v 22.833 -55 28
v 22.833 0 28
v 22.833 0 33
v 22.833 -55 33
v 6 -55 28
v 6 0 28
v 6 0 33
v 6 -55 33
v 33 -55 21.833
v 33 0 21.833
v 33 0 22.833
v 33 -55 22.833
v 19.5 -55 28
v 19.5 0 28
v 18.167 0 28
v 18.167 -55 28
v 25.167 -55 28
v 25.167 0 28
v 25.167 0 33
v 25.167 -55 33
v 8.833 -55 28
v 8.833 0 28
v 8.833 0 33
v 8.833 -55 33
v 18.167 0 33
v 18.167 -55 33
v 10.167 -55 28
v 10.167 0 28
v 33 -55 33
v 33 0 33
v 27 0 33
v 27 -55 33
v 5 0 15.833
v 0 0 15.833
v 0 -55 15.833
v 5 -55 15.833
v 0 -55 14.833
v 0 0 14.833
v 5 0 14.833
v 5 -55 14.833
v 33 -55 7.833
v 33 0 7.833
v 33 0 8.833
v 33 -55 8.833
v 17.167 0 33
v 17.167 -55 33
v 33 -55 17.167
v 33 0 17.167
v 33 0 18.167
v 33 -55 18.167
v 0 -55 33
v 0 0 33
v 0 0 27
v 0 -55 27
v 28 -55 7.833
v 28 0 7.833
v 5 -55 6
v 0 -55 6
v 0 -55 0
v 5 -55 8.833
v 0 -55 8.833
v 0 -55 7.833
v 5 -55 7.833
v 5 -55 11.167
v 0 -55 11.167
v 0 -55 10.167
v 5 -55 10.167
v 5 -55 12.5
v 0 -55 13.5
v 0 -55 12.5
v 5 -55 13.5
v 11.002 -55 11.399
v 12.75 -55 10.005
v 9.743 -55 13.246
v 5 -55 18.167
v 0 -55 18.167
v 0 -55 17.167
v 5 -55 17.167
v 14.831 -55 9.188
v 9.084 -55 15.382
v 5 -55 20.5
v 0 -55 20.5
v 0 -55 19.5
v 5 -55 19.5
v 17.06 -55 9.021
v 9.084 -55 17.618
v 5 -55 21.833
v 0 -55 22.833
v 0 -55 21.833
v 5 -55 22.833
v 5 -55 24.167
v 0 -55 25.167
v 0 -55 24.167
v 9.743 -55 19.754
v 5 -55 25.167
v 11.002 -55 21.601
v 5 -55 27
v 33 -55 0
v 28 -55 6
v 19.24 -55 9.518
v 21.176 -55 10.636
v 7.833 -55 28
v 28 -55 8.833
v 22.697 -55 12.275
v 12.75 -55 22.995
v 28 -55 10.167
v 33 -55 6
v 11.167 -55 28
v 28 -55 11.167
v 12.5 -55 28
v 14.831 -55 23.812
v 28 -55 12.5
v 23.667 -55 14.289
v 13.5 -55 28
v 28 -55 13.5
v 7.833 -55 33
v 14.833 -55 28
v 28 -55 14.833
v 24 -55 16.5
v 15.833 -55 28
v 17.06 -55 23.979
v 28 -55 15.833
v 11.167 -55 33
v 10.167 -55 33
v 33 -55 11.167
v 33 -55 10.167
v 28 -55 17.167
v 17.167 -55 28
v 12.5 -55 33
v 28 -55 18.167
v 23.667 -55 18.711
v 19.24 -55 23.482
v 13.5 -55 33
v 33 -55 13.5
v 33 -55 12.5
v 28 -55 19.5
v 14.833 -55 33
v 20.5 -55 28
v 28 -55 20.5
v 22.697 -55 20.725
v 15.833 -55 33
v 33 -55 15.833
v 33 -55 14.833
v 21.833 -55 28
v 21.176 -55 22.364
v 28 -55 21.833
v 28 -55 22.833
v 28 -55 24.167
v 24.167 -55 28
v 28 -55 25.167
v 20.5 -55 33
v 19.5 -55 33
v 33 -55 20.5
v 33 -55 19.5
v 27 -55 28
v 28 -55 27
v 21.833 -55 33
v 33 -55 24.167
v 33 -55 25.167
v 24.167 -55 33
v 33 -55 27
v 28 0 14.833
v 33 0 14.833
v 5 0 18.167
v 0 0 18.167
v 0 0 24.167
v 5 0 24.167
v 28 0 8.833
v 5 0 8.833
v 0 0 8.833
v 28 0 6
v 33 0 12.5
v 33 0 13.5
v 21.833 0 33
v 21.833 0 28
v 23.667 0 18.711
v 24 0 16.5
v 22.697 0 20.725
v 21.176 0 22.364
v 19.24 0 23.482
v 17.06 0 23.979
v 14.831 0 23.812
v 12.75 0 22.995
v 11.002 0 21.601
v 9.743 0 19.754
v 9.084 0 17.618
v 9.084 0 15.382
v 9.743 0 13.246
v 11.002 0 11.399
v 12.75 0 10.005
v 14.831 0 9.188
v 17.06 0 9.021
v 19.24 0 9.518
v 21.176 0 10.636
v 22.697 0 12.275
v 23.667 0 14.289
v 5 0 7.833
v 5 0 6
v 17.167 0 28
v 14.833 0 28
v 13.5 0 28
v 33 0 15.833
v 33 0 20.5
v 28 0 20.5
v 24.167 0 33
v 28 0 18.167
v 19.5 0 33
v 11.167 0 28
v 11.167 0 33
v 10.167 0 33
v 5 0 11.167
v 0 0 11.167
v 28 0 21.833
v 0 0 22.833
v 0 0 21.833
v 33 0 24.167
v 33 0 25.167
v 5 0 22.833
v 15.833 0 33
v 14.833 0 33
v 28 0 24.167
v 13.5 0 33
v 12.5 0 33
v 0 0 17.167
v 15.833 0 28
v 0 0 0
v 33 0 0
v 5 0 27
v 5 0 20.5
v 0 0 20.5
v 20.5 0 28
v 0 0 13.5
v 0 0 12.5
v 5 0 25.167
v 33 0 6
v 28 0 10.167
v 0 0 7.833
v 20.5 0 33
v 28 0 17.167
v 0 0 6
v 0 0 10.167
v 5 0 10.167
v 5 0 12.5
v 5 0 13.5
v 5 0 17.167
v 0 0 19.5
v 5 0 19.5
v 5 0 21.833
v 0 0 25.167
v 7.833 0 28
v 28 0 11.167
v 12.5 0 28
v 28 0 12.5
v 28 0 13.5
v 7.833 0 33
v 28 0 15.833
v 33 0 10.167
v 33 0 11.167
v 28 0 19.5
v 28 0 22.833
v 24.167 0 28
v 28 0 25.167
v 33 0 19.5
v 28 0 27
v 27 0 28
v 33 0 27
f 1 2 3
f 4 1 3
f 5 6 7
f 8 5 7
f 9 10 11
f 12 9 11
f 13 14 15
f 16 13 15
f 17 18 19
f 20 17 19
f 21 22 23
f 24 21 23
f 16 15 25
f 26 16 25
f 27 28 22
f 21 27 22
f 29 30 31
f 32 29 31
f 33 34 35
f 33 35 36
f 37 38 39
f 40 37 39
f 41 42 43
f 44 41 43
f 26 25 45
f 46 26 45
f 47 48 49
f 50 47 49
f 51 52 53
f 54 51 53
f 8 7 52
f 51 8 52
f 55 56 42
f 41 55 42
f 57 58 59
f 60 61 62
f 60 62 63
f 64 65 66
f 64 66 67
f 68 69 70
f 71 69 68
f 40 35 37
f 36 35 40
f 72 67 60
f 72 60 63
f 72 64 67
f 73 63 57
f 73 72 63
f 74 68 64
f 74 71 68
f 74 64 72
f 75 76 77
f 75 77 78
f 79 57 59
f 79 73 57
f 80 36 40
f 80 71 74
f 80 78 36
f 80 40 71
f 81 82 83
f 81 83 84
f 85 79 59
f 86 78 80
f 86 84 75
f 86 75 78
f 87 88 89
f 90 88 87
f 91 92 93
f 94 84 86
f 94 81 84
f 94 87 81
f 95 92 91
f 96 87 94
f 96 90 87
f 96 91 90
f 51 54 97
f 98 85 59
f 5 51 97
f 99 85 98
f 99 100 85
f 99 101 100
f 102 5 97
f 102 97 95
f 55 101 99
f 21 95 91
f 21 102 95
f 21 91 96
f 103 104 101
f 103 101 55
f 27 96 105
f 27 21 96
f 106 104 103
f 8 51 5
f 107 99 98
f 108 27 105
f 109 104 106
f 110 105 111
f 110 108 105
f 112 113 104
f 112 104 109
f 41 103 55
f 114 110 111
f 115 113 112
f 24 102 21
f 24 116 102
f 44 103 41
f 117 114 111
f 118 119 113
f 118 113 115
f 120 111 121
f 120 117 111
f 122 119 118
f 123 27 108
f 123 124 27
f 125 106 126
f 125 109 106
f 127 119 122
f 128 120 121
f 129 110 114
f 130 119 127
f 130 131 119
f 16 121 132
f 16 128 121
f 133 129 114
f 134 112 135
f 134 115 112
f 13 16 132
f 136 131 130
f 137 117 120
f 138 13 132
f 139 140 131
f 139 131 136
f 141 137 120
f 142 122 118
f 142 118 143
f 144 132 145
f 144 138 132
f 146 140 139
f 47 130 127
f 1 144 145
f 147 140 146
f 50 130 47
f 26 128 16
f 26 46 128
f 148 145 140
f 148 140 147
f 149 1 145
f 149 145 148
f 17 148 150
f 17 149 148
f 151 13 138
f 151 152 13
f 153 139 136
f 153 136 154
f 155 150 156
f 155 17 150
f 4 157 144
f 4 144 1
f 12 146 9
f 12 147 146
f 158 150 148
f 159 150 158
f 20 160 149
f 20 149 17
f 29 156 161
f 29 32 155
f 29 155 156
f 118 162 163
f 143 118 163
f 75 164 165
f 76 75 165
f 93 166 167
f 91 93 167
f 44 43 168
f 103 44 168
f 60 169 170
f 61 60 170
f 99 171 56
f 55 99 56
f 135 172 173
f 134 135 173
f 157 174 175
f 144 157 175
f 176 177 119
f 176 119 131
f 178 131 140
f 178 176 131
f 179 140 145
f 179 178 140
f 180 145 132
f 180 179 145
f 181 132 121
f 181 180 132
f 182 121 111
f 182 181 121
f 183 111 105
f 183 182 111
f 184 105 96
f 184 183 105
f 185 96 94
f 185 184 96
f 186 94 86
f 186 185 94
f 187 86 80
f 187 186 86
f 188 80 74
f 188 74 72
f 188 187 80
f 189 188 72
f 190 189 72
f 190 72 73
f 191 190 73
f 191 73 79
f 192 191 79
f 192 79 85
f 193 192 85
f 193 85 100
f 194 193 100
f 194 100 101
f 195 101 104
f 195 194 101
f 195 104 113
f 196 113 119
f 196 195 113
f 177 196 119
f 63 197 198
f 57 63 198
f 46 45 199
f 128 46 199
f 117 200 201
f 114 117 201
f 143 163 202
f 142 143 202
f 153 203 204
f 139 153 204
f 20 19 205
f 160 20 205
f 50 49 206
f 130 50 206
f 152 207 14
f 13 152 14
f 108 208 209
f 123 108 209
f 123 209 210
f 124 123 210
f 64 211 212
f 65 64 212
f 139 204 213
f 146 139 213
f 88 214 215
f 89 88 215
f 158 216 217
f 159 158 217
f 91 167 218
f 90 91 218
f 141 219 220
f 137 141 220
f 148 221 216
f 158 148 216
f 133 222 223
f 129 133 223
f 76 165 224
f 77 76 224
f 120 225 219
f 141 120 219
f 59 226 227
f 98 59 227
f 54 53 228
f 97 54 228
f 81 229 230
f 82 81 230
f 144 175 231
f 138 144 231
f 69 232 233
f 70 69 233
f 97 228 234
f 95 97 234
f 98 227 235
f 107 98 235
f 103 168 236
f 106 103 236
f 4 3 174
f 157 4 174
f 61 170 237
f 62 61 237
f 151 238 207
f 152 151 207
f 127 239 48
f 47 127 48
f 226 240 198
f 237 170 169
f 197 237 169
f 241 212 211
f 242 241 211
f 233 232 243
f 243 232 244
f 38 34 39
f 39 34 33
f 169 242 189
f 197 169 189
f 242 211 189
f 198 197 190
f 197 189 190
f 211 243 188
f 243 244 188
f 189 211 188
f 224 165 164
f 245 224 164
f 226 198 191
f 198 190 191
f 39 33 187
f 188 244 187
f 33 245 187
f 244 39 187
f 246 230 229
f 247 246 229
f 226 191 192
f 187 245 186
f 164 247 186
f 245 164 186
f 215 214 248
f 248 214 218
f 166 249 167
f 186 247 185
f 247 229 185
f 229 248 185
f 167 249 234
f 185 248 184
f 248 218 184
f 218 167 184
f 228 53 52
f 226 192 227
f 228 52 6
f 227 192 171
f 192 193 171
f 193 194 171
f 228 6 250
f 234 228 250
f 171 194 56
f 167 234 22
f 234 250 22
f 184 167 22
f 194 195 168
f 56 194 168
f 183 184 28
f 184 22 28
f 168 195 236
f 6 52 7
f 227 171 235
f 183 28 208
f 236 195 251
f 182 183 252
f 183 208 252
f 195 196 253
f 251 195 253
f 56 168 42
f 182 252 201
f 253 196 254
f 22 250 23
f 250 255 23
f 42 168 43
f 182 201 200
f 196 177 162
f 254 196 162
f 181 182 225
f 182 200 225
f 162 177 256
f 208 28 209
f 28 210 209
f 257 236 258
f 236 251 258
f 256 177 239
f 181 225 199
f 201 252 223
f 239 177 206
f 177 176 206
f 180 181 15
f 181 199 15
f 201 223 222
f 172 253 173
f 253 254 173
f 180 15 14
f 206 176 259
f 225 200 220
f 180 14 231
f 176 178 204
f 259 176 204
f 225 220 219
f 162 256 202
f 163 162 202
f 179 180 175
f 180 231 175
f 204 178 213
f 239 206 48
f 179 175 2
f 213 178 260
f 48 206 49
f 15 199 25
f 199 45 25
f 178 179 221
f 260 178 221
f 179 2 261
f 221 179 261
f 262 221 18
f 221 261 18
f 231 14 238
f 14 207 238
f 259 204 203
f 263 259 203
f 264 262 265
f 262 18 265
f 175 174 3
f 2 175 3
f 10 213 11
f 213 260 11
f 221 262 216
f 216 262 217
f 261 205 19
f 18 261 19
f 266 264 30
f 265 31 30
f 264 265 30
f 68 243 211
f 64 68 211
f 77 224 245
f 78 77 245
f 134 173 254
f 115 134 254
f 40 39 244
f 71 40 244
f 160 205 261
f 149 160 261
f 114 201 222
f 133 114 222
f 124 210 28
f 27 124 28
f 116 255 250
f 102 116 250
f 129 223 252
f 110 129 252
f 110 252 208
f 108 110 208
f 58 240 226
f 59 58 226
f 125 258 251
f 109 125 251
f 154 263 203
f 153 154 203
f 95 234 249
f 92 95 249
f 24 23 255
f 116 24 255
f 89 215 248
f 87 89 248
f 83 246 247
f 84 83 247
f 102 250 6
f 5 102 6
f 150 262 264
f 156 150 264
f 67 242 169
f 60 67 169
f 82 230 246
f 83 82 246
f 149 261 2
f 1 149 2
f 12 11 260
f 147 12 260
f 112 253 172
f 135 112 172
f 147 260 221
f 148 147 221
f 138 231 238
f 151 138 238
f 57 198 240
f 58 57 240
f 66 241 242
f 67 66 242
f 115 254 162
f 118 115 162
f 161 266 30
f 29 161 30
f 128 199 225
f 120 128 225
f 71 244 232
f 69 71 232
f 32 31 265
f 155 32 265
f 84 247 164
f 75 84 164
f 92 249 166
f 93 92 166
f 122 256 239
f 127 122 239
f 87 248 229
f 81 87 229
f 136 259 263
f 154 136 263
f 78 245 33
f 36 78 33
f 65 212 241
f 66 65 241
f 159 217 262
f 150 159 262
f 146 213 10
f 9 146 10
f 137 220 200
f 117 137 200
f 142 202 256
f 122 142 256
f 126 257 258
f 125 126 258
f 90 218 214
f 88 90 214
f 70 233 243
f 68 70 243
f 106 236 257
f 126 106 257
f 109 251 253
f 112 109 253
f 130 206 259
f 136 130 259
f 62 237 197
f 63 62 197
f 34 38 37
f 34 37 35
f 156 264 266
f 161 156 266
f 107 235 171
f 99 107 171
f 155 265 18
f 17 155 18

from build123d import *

# Parameters (mm, degrees)
F0_R     = 7.5
F0_W     = 5
F0_H     = 1
F1_DEPTH = 55


with BuildPart() as f1:
    # F0 (on Front) → F1 (new body)
    with BuildSketch(Plane.XZ):
        Polygon((0, 6), (0, 0), (33, 0), (33, 6), (28, 6), (28, 7.833333), (33, 7.833333), (33, 8.833333), (28, 8.833333), (28, 10.166667), (33, 10.166667), (33, 11.166667), (28, 11.166667), (28, 12.5), (33, 12.5), (33, 13.5), (28, 13.5), (28, 14.833333), (33, 14.833333), (33, 15.833333), (28, 15.833333), (28, 17.166667), (33, 17.166667), (33, 18.166667), (28, 18.166667), (28, 19.5), (33, 19.5), (33, 20.5), (28, 20.5), (28, 21.833333), (33, 21.833333), (33, 22.833333), (28, 22.833333), (28, 24.166667), (33, 24.166667), (33, 25.166667), (28, 25.166667), (28, 27), (33, 27), (33, 33), (27, 33), (27, 28), (25.166667, 28), (25.166667, 33), (24.166667, 33), (24.166667, 28), (22.833333, 28), (22.833333, 33), (21.833333, 33), (21.833333, 28), (20.5, 28), (20.5, 33), (19.5, 33), (19.5, 28), (18.166667, 28), (18.166667, 33), (17.166667, 33), (17.166667, 28), (15.833333, 28), (15.833333, 33), (14.833333, 33), (14.833333, 28), (13.5, 28), (13.5, 33), (12.5, 33), (12.5, 28), (11.166667, 28), (11.166667, 33), (10.166667, 33), (10.166667, 28), (8.833333, 28), (8.833333, 33), (7.833333, 33), (7.833333, 28), (6, 28), (6, 33), (0, 33), (0, 27), (5, 27), (5, 25.166667), (0, 25.166667), (0, 24.166667), (5, 24.166667), (5, 22.833333), (0, 22.833333), (0, 21.833333), (5, 21.833333), (5, 20.5), (0, 20.5), (0, 19.5), (5, 19.5), (5, 18.166667), (0, 18.166667), (0, 17.166667), (5, 17.166667), (5, 15.833333), (5, 14.833333), (5, 13.5), (0, 13.5), (0, 12.5), (5, 12.5), (5, 11.166667), (0, 11.166667), (0, 10.166667), (5, 10.166667), (5, 8.833333), (0, 8.833333), (0, 7.833333), (5, 7.833333), (5, 6), align=None)
        with Locations((16.5, 16.5)):
            Circle(F0_R, mode=Mode.SUBTRACT)
        with Locations((2.5, 15.333333)):
            Rectangle(F0_W, F0_H)
    extrude(amount=F1_DEPTH)


solid = f1.part
